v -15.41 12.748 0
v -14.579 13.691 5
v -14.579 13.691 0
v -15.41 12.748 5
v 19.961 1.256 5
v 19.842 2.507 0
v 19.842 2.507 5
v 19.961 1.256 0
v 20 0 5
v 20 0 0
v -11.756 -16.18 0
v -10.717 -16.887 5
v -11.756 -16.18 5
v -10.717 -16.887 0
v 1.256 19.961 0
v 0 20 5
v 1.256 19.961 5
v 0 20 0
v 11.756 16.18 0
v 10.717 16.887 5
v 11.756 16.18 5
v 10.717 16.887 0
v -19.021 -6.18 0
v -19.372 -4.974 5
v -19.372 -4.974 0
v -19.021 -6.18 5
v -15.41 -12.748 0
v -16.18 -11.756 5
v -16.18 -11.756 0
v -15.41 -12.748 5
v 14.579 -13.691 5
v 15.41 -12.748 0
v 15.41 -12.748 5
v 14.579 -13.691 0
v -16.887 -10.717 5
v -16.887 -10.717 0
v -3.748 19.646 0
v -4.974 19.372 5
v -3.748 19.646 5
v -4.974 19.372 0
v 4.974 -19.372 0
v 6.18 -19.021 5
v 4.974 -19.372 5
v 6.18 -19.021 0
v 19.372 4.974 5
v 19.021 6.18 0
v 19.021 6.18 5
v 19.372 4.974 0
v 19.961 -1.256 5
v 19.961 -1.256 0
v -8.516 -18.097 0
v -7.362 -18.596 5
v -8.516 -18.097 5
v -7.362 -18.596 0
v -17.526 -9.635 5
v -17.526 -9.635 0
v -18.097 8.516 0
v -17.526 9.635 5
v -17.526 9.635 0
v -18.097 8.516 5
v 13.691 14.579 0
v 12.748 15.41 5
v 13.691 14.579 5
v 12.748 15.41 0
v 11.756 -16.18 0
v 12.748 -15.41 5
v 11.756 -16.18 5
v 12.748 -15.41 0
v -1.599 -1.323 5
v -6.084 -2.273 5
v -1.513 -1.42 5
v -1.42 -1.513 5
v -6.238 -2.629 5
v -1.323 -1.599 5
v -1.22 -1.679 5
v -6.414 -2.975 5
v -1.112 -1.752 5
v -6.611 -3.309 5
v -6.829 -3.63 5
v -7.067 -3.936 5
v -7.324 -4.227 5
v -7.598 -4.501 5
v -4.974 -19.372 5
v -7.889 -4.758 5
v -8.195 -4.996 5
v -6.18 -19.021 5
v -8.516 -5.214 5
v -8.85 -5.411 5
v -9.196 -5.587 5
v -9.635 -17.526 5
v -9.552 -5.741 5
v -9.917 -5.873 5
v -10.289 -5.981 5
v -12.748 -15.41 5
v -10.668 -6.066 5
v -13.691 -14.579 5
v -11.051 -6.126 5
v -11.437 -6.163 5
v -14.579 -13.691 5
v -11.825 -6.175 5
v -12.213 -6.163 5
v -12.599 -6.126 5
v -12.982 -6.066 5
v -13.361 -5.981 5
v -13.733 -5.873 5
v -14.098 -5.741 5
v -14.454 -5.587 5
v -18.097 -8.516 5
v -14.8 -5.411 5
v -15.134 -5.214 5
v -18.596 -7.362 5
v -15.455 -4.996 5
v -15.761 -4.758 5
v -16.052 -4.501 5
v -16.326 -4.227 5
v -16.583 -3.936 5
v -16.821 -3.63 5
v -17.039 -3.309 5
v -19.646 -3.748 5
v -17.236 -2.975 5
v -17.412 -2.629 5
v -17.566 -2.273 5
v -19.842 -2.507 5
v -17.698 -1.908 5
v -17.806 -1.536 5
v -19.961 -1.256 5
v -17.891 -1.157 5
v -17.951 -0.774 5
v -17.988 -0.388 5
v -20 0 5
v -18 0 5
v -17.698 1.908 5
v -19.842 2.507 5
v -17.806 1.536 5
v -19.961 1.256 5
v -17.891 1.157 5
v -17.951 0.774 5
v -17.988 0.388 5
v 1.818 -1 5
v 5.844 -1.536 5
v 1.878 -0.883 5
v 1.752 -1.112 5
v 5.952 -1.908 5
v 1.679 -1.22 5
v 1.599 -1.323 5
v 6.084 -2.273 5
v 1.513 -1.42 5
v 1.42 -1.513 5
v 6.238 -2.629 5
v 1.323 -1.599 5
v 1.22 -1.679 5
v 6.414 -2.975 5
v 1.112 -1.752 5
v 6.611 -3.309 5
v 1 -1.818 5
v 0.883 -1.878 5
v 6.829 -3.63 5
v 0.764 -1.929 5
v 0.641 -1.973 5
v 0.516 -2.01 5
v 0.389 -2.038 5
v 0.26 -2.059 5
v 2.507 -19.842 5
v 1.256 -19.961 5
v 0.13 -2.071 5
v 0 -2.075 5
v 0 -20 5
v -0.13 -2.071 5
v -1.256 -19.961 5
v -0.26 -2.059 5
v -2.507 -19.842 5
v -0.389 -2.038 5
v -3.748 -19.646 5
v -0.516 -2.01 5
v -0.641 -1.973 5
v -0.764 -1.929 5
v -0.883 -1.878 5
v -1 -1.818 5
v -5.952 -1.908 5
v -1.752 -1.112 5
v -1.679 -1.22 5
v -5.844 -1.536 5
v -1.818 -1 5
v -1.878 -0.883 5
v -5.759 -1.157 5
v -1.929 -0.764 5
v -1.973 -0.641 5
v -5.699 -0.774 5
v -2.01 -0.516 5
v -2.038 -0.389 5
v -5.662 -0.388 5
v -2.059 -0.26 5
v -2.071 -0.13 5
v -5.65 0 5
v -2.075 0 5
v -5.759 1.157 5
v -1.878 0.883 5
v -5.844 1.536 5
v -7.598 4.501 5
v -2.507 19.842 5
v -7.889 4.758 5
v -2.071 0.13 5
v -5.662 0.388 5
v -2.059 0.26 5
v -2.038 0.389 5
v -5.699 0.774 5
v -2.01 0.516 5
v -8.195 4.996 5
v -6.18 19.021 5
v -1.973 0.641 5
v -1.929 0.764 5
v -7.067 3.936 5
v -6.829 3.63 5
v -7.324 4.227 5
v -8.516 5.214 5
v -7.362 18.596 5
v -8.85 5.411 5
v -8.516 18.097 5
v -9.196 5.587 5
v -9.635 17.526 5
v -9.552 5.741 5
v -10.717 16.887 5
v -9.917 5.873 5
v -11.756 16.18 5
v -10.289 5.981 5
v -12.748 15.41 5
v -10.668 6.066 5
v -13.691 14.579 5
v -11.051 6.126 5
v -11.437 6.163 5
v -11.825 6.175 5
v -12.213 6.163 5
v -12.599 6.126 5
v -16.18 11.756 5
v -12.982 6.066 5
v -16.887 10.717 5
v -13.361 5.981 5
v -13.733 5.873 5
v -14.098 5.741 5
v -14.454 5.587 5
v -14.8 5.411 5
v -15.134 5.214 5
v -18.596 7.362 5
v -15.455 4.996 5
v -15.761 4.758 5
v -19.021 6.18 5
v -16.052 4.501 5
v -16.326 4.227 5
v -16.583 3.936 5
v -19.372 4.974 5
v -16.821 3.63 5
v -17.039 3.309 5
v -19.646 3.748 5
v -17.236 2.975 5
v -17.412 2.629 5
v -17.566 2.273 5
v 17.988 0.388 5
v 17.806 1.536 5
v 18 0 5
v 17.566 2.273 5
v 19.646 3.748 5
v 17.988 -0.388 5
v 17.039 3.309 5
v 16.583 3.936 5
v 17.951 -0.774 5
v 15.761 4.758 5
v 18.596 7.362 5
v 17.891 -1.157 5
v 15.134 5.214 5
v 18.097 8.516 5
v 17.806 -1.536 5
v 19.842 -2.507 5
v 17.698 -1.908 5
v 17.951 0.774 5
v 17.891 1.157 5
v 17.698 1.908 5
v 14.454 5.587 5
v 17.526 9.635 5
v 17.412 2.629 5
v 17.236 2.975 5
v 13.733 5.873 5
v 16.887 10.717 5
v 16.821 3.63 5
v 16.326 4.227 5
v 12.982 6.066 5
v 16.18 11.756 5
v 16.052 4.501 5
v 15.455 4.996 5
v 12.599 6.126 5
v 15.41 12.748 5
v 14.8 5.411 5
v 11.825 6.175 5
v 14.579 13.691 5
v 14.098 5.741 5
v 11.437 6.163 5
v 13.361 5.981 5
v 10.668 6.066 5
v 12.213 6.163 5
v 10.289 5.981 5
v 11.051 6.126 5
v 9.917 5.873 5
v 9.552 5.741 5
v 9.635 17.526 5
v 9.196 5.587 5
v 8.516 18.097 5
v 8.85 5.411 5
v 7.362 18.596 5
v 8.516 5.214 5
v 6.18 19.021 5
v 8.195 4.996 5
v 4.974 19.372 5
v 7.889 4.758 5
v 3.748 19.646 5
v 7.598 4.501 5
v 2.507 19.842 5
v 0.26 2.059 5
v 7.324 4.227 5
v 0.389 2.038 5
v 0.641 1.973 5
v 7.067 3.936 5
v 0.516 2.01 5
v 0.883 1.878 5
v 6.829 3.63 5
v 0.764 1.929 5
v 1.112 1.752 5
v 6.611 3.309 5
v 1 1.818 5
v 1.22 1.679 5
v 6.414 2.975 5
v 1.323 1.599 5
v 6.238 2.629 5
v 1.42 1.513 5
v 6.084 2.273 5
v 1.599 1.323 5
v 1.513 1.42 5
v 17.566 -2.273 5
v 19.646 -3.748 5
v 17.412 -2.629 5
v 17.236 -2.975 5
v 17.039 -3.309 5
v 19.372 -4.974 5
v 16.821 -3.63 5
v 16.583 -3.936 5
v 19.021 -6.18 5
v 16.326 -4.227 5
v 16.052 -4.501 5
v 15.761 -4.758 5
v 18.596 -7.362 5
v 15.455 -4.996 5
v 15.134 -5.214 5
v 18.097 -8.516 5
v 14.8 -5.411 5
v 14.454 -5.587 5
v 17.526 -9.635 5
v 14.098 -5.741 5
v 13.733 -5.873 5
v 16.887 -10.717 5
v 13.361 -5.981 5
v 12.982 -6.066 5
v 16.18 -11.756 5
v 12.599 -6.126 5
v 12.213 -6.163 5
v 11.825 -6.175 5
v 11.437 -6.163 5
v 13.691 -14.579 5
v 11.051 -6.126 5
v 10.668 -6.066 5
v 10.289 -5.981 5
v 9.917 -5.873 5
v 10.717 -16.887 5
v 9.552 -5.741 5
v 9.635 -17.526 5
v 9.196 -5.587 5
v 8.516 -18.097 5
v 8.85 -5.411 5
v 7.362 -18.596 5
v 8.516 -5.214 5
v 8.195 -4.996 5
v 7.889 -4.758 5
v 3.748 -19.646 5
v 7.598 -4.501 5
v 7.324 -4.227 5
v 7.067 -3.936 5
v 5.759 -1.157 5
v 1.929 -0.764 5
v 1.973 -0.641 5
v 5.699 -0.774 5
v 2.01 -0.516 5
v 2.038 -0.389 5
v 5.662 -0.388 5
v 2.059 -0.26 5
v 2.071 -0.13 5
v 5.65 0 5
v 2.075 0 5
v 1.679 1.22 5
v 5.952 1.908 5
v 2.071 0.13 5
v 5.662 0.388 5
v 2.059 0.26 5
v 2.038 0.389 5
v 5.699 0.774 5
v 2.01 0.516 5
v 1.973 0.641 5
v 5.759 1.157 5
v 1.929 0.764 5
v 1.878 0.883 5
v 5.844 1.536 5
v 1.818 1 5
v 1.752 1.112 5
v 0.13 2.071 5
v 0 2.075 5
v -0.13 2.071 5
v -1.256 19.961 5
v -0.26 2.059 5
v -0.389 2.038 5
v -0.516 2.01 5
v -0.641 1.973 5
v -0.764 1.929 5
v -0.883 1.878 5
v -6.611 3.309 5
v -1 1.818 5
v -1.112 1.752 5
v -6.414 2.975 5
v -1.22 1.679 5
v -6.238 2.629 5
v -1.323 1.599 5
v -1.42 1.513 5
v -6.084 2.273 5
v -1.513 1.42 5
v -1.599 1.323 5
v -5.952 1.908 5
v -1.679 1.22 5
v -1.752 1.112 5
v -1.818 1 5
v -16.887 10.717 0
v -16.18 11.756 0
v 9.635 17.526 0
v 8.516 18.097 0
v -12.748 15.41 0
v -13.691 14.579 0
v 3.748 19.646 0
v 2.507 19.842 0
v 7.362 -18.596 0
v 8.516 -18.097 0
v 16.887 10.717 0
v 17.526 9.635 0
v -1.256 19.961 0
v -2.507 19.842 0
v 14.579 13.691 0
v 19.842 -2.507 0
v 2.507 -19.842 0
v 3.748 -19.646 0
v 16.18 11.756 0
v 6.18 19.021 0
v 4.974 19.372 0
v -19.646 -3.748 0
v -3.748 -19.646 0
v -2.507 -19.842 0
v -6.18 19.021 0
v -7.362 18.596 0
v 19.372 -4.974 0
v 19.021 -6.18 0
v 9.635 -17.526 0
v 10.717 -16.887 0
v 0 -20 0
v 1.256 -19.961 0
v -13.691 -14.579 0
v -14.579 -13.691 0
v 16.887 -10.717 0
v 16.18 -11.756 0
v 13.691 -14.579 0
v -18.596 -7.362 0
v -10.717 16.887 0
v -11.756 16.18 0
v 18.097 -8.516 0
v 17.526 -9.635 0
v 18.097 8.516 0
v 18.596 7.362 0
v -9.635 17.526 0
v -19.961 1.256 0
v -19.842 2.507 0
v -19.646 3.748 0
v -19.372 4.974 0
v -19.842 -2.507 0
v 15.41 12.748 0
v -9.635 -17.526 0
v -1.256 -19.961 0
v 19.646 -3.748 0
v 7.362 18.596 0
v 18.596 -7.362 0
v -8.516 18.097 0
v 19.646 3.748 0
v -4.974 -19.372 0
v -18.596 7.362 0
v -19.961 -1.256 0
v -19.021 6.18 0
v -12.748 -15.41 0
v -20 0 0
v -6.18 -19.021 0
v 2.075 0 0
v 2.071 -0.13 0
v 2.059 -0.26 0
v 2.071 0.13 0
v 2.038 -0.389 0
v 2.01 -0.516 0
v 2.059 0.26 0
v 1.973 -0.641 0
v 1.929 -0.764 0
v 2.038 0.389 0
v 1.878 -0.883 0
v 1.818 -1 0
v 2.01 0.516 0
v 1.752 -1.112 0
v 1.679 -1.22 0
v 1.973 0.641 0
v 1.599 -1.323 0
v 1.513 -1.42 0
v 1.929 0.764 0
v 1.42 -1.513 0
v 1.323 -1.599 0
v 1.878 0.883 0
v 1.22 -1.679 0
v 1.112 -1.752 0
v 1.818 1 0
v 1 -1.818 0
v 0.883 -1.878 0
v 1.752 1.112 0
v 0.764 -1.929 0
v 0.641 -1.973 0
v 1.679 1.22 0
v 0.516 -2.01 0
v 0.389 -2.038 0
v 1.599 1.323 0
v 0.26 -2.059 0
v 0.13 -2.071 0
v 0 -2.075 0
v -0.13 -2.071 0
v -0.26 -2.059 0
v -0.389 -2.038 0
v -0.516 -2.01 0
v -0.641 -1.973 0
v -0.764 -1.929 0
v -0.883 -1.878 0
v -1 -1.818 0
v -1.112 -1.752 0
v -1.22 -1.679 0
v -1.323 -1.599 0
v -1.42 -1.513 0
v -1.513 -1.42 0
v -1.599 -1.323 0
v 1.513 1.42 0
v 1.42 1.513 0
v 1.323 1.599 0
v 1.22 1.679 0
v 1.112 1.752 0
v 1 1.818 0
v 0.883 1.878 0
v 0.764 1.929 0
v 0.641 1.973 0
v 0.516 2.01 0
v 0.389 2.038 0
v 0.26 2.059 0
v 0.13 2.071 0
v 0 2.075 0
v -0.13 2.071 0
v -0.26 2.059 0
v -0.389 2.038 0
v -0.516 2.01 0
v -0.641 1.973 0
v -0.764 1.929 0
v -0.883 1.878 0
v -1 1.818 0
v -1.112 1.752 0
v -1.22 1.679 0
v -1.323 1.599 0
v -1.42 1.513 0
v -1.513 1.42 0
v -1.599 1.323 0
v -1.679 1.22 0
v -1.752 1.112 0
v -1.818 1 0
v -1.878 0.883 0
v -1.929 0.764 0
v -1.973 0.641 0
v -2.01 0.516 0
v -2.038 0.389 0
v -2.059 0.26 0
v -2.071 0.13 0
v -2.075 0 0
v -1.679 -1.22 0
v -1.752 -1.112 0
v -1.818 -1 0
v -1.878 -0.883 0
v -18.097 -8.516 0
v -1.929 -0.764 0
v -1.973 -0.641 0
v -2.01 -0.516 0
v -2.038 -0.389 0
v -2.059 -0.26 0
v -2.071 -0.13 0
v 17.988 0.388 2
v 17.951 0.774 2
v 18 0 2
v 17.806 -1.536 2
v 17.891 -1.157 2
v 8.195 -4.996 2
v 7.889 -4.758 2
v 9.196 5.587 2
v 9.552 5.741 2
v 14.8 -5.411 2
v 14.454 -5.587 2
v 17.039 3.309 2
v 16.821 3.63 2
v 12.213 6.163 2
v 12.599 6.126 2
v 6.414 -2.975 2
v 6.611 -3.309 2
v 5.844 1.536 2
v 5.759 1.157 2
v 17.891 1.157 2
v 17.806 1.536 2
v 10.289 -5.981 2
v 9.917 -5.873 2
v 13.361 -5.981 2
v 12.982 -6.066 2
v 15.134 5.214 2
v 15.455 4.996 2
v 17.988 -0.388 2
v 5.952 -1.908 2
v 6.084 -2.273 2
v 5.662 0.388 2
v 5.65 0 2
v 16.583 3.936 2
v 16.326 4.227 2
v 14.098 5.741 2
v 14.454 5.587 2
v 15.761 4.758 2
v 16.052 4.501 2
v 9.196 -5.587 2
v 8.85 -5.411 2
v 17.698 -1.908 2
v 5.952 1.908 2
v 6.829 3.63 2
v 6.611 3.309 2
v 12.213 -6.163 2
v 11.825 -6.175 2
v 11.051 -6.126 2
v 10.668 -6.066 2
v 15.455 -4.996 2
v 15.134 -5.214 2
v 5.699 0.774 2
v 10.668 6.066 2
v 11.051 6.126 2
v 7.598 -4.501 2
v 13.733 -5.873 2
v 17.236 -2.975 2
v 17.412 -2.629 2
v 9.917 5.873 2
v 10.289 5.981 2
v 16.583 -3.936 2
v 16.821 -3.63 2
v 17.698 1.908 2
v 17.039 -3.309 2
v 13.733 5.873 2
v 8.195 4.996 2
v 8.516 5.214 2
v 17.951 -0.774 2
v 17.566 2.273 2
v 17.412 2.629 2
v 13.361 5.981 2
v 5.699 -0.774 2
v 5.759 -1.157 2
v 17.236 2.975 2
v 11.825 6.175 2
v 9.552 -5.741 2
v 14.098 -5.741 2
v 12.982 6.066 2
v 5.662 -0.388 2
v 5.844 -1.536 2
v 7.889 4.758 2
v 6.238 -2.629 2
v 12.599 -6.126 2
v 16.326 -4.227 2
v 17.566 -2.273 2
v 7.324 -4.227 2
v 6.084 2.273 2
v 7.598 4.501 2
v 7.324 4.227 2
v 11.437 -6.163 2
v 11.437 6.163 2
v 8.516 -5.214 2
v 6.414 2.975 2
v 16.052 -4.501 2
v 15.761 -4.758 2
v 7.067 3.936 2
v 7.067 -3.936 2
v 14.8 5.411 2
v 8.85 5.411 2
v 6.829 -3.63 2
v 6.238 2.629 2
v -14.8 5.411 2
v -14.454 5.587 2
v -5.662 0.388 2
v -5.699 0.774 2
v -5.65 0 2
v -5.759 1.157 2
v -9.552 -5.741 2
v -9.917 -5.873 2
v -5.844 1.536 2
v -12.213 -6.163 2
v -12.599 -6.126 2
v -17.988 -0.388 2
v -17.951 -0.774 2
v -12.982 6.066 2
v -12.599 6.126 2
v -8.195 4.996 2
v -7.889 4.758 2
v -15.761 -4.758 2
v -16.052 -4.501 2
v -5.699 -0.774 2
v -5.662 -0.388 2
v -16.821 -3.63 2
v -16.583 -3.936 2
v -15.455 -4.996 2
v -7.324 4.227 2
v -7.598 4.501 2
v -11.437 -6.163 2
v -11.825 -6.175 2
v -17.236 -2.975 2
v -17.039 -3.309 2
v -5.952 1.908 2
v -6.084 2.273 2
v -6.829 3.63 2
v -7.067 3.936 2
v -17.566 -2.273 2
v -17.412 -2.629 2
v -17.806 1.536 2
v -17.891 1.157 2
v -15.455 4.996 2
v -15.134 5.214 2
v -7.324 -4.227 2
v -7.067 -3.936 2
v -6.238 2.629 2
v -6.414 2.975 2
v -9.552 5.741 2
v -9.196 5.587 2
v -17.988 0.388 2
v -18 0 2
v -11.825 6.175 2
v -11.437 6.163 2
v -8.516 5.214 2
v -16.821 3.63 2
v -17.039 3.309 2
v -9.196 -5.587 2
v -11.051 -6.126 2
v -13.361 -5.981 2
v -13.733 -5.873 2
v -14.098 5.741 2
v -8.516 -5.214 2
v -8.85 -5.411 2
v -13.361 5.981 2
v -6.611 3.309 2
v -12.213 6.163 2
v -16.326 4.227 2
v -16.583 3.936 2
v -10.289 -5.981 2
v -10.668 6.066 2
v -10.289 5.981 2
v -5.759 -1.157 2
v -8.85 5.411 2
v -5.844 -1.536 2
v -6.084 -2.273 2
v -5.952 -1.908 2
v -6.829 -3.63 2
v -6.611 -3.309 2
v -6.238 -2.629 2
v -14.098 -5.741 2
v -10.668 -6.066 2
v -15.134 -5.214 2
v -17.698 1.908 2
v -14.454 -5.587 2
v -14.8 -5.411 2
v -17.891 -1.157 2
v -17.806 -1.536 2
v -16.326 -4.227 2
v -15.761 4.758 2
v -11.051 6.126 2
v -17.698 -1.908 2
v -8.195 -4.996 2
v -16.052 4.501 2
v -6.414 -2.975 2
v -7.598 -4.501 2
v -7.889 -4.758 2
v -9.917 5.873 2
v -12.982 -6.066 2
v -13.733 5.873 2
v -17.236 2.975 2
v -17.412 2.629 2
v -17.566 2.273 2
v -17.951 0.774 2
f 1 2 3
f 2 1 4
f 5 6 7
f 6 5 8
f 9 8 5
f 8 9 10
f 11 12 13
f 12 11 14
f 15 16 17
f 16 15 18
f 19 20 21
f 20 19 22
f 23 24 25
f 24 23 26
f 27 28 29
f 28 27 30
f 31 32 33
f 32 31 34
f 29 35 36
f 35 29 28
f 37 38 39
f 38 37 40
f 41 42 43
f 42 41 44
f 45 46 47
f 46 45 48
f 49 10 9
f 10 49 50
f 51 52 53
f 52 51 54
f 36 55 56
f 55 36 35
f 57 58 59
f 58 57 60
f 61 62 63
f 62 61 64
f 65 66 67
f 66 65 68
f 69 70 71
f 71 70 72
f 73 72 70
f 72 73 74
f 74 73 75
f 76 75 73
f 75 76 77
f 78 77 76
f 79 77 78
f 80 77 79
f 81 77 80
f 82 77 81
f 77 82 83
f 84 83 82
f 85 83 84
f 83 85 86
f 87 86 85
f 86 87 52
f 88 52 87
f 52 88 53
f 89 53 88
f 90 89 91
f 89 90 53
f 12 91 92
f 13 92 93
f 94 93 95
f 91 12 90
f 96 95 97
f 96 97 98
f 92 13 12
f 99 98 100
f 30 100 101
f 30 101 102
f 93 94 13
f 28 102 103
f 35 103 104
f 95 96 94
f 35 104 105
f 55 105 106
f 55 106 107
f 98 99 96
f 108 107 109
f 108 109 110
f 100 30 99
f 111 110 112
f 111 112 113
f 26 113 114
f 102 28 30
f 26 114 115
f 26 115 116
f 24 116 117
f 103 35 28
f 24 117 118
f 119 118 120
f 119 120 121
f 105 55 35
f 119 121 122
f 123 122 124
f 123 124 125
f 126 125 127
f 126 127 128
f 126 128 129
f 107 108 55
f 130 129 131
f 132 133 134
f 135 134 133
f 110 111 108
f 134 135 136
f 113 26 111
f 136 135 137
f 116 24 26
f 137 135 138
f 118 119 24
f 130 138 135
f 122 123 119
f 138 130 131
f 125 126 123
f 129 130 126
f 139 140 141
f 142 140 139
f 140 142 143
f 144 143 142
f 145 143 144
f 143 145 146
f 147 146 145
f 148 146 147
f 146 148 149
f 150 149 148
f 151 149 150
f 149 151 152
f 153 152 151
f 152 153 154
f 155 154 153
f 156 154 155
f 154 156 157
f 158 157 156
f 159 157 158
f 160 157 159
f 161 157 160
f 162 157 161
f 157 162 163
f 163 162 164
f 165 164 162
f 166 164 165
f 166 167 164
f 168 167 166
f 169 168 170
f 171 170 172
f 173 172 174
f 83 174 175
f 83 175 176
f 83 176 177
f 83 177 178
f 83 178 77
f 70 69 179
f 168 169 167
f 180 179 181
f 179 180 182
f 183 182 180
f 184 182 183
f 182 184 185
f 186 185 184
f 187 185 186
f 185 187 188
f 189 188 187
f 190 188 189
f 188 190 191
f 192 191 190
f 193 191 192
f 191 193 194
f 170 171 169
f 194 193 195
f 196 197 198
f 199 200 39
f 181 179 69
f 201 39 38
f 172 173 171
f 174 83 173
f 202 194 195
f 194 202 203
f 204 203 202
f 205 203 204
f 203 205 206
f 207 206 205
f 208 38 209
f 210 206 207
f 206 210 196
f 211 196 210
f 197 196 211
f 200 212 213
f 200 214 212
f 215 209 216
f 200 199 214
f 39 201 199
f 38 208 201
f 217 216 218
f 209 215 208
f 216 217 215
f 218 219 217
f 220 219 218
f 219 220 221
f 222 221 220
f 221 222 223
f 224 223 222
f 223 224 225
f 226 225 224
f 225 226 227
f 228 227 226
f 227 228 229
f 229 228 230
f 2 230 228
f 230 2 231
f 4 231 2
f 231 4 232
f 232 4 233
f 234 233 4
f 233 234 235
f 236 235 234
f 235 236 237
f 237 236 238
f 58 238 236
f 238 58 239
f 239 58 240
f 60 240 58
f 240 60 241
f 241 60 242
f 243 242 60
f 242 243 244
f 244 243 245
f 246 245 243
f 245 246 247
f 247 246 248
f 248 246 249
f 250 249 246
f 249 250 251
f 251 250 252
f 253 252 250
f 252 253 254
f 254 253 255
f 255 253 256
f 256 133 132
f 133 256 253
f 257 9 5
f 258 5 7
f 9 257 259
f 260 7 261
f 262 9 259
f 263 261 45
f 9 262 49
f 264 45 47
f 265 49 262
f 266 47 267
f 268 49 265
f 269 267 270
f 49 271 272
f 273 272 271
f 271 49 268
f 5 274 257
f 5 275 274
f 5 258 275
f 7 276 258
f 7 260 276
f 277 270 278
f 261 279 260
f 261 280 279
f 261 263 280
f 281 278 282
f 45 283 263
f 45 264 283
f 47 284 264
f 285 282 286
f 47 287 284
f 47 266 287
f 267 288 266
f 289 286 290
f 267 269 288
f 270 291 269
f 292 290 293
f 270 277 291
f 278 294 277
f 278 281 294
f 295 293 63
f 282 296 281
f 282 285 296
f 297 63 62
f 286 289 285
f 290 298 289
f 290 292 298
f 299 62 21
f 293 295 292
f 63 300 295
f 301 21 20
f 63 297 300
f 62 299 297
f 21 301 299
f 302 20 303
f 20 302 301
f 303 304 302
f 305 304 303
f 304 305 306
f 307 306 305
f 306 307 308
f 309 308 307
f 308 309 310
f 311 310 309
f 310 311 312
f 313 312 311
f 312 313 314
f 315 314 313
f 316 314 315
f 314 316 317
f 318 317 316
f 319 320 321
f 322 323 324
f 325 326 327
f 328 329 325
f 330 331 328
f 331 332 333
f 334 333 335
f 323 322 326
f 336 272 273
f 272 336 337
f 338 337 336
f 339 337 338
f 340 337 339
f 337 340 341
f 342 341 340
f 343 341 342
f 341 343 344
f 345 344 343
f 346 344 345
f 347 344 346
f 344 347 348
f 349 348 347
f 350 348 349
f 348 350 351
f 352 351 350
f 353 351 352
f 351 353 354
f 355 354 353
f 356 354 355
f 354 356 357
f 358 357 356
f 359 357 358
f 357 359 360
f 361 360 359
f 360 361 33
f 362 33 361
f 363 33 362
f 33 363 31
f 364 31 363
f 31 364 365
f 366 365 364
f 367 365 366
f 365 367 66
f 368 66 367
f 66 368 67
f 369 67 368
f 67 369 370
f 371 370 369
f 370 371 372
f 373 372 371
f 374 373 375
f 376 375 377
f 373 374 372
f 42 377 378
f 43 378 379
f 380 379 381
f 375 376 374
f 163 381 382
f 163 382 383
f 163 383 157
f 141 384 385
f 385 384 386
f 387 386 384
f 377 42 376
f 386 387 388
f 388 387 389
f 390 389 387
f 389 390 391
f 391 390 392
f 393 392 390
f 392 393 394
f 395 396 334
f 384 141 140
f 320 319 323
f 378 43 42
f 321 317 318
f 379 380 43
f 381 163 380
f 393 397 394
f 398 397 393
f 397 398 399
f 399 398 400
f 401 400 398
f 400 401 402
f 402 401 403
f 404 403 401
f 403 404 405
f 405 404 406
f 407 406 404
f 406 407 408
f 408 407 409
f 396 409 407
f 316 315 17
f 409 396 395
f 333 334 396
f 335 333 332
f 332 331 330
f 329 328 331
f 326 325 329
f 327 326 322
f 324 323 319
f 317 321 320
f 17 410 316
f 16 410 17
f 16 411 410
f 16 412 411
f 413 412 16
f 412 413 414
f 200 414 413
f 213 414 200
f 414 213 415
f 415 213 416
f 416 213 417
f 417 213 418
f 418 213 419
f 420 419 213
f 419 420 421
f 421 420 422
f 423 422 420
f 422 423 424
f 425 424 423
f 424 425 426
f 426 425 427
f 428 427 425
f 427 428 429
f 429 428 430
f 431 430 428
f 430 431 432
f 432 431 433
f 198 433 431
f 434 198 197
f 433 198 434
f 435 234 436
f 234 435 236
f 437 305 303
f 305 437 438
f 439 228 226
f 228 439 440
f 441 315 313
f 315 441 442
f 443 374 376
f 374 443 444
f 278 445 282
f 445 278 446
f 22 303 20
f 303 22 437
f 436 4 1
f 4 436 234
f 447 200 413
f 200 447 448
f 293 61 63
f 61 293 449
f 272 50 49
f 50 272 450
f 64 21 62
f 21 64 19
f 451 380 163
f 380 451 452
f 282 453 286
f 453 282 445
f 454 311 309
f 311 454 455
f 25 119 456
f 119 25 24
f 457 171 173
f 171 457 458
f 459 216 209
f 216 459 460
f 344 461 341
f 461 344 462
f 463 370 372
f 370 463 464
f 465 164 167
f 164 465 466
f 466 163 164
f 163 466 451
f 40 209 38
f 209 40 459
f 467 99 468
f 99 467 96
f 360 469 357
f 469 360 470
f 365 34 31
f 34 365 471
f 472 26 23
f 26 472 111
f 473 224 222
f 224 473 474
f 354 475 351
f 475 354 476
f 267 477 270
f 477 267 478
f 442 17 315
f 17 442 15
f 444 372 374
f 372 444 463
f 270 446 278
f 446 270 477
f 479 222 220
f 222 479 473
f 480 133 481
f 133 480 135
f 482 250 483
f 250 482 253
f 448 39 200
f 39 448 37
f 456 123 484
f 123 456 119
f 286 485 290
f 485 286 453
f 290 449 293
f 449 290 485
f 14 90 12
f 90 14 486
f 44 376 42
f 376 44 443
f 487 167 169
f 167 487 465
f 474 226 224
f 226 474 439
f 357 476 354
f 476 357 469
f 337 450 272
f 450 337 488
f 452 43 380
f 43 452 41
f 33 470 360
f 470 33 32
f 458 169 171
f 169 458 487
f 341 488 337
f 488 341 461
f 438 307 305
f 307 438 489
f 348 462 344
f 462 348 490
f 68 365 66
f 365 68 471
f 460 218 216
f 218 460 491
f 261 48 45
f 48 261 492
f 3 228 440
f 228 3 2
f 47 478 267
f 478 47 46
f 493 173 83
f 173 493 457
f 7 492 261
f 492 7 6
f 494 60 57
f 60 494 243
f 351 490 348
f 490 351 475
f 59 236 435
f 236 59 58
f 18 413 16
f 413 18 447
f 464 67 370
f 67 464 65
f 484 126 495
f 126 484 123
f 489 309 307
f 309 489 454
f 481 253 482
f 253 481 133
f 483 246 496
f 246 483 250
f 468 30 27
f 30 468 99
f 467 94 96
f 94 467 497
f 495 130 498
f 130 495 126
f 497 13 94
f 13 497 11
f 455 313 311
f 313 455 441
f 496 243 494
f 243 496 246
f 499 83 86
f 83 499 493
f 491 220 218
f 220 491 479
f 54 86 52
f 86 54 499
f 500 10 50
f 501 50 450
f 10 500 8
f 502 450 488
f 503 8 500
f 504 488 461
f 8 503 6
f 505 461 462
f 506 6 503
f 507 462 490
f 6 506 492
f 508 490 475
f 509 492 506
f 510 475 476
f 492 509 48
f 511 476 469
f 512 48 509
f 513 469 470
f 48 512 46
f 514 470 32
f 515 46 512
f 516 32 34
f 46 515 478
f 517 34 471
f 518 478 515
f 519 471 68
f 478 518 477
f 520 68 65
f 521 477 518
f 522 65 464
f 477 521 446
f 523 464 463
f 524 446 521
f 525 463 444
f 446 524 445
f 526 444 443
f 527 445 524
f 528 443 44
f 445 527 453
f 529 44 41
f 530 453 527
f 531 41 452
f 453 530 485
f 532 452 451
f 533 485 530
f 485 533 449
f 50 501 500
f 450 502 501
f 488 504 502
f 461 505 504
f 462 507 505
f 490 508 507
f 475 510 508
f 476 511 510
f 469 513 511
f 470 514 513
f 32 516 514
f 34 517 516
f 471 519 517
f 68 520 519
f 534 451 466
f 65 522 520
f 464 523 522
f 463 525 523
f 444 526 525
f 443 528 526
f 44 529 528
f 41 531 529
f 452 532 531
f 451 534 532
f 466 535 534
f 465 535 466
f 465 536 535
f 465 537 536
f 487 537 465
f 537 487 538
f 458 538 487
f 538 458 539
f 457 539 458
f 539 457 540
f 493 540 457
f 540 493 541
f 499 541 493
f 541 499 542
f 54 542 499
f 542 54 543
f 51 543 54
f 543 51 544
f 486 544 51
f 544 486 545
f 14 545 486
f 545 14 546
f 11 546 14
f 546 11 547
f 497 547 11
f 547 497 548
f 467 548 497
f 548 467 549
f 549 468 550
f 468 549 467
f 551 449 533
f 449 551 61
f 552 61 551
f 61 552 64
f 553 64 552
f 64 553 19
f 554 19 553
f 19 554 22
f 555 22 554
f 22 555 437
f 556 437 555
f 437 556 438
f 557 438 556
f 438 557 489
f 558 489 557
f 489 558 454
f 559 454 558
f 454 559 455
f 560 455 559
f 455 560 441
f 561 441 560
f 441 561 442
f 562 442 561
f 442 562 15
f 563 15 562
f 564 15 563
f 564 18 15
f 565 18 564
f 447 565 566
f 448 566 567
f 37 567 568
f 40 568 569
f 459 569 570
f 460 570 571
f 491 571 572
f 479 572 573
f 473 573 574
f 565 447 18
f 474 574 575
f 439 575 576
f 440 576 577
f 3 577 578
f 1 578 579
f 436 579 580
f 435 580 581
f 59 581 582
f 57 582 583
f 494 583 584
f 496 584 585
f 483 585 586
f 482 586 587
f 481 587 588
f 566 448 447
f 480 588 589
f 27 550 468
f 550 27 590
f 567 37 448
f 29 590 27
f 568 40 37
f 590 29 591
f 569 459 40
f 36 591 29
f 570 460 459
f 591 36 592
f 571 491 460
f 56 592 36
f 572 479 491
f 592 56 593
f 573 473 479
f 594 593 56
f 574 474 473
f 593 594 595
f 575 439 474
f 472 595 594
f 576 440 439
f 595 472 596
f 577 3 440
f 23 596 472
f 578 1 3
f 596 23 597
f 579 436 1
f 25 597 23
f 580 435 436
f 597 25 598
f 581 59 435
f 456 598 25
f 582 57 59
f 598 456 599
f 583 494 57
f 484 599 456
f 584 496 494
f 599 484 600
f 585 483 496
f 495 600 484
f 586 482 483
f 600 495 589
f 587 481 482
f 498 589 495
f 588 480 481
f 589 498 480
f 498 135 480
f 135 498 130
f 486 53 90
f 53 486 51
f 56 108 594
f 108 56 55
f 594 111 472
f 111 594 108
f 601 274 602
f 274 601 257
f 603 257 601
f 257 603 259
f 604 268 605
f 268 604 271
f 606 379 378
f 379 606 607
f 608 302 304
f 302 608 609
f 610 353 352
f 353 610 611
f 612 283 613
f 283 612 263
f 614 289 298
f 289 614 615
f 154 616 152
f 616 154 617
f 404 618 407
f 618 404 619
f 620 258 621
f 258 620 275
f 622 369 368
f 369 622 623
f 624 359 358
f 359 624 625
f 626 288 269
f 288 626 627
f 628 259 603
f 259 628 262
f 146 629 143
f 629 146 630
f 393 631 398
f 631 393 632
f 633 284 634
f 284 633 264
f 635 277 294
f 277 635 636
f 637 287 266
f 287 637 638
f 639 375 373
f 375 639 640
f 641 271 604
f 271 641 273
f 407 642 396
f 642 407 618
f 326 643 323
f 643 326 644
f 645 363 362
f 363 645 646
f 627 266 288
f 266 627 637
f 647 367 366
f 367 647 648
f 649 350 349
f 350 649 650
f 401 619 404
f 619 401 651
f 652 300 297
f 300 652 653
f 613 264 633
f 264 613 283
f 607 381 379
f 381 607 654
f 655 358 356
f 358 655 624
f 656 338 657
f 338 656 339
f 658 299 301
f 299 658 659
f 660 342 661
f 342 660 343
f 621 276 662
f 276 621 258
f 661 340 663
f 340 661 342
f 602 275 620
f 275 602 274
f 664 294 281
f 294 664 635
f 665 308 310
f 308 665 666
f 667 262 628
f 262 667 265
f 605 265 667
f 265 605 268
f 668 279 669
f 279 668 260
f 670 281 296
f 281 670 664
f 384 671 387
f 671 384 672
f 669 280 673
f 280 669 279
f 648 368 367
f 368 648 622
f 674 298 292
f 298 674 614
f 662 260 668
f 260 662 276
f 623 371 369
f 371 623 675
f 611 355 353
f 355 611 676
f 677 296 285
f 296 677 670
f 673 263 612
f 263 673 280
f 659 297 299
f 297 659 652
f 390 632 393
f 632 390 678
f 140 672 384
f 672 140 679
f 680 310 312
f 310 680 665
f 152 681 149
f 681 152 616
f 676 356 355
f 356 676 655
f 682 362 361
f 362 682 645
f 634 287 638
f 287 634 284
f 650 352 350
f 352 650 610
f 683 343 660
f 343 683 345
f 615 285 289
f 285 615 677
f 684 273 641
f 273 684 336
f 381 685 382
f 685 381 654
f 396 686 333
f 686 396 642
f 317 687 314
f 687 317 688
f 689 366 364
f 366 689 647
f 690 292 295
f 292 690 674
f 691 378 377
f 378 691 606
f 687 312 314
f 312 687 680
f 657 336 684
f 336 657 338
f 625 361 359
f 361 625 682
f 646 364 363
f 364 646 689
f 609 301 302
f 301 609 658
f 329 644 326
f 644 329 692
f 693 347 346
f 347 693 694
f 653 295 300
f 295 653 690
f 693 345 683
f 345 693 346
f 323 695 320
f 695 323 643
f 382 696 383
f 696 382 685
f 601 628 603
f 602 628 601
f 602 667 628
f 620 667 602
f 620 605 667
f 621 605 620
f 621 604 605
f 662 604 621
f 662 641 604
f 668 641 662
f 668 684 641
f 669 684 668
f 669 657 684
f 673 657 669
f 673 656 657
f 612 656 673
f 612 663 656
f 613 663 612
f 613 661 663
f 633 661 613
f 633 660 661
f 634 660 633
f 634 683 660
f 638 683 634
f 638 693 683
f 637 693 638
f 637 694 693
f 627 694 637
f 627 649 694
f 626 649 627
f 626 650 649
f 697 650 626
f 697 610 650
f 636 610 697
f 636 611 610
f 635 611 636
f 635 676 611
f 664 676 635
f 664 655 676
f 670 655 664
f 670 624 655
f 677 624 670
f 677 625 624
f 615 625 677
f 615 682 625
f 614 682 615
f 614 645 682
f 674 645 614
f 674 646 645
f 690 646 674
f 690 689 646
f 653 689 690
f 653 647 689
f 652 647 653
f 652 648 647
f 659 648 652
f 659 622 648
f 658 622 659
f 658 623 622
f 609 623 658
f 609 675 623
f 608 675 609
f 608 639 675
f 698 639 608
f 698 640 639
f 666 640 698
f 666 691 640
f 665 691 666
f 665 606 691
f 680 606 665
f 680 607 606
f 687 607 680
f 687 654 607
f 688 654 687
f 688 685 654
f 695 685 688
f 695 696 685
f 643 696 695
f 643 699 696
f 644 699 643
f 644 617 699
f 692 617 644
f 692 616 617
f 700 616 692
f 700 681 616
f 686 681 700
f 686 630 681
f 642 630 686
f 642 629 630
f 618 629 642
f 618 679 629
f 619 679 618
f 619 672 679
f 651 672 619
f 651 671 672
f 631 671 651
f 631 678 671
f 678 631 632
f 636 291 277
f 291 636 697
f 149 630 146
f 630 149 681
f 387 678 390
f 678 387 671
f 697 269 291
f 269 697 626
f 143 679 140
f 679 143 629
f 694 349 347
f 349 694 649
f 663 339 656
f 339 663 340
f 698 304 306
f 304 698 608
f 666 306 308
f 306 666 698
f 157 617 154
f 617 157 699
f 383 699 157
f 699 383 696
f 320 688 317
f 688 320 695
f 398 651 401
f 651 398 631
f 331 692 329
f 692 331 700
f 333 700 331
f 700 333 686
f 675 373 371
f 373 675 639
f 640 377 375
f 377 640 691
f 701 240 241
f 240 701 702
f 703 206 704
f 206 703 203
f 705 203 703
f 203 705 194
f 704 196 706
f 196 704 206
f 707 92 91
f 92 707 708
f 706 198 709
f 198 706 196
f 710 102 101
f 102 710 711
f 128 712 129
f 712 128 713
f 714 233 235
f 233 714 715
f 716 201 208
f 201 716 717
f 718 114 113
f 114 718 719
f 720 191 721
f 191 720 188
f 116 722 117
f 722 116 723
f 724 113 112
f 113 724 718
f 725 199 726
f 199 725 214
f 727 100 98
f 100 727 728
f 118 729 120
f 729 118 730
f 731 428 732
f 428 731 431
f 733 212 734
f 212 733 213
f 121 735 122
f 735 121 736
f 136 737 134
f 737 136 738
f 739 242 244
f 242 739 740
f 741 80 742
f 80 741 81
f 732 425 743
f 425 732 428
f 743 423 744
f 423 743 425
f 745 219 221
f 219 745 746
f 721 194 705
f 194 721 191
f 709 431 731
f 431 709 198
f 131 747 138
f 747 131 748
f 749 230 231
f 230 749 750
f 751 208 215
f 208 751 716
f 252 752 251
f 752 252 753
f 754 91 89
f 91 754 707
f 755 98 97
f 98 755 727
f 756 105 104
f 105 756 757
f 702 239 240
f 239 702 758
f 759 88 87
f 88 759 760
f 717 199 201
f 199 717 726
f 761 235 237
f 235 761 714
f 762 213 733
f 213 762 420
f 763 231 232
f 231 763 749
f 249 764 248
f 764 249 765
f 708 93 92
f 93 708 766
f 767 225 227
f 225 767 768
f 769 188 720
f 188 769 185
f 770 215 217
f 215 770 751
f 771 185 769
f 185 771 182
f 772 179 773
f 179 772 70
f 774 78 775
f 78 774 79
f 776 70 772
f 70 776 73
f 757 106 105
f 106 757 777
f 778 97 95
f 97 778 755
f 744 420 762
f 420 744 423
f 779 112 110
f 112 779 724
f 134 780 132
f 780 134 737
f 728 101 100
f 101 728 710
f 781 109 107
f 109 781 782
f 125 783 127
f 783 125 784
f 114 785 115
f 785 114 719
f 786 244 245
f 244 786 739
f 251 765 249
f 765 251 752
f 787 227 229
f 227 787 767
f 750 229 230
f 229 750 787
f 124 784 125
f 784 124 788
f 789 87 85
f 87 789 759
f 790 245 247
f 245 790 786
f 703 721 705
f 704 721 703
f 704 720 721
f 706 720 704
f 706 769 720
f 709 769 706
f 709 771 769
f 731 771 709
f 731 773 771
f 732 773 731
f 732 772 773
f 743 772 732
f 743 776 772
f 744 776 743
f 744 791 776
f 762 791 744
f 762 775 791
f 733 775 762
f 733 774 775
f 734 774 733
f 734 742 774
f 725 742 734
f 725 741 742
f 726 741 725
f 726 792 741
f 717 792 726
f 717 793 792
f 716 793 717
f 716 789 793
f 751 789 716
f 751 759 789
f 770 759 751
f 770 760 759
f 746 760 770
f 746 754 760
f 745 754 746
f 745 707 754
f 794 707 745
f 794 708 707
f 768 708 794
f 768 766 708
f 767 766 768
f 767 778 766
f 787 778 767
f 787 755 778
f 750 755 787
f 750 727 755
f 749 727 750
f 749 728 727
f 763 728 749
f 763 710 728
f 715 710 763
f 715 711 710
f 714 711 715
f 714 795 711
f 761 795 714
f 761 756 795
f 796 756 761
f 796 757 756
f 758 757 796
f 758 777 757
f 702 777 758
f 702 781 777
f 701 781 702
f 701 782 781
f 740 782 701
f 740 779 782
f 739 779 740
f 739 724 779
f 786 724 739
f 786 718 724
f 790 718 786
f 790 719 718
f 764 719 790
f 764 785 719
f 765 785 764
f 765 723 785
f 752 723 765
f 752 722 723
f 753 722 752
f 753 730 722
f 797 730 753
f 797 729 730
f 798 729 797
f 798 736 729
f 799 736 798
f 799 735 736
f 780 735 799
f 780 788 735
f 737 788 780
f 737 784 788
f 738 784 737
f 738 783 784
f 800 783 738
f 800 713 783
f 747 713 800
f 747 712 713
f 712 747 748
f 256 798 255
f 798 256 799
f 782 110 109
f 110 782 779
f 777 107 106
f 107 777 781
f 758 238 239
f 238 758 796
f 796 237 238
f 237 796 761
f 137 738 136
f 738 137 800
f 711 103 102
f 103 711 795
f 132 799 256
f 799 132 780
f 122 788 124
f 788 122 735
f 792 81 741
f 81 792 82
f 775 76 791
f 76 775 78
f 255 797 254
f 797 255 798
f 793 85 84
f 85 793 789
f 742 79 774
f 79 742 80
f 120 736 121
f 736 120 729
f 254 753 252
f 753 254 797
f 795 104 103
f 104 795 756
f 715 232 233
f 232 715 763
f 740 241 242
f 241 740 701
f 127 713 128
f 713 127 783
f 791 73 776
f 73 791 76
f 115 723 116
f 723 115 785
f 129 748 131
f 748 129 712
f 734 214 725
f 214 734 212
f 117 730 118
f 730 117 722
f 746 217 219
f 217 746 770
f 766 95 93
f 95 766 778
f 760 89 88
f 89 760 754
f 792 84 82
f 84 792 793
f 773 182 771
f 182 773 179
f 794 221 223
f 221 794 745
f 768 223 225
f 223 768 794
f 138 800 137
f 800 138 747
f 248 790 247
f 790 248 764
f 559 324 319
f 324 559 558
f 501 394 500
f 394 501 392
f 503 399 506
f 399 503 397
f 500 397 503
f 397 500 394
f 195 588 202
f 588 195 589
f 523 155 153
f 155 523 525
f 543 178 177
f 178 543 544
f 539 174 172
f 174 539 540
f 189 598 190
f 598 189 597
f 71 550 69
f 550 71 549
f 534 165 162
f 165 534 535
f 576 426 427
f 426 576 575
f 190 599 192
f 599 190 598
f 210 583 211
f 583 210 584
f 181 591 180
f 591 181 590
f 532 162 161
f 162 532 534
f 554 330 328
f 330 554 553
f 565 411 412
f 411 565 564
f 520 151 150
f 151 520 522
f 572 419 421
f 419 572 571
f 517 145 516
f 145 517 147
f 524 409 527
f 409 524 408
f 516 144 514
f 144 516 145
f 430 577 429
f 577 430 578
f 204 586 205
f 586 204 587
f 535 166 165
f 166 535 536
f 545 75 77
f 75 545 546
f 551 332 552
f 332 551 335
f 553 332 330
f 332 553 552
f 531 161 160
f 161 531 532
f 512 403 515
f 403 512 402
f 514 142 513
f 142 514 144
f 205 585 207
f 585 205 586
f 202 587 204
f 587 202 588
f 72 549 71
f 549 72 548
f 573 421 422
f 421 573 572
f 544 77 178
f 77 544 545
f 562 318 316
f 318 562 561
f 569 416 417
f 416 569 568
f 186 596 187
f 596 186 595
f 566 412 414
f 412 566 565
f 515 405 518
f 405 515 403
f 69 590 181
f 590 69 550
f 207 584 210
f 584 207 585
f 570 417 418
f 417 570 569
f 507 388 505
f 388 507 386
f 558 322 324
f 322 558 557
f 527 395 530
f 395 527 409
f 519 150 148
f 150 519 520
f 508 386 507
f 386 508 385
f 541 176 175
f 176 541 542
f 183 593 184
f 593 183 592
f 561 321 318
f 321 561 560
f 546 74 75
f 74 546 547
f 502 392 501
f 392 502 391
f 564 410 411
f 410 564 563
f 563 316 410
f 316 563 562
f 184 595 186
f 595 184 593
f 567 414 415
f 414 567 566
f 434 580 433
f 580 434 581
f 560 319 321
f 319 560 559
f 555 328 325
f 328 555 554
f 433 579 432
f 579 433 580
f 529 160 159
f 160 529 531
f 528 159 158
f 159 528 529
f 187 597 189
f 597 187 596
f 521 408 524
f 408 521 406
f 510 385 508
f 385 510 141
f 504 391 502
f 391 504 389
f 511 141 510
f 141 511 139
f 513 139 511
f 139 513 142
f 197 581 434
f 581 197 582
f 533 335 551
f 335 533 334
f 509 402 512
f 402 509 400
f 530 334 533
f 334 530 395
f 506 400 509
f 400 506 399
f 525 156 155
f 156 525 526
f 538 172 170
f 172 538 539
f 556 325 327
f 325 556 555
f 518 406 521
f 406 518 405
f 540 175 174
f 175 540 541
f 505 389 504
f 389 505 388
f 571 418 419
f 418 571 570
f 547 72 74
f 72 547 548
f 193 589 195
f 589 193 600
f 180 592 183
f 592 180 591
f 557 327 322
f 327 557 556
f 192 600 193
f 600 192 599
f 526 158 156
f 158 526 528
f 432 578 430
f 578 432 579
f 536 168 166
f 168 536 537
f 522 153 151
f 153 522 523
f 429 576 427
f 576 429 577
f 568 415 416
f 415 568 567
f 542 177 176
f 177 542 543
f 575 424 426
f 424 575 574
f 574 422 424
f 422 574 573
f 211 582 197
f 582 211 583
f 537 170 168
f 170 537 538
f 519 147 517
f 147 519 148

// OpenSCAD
$fn=100;

plate_width = 40;
plate_height = 5;

magnet_slot_width = 12.35;
magnet_slot_height = 3;
magnet_slot_edge = 2;

pin = 4.15;

difference() {
    cylinder(h=plate_height, r=plate_width/2);
    translate([plate_width/2-magnet_slot_width/2-magnet_slot_edge,0,plate_height-magnet_slot_height]) cylinder(h=magnet_slot_height+1, r=magnet_slot_width/2);
    translate([-(plate_width/2-magnet_slot_width/2-magnet_slot_edge),0,plate_height-magnet_slot_height]) cylinder(h=magnet_slot_height+1, r=magnet_slot_width/2);
    translate([0,0,-1]) cylinder(h=plate_height+2, r=pin/2);
}
